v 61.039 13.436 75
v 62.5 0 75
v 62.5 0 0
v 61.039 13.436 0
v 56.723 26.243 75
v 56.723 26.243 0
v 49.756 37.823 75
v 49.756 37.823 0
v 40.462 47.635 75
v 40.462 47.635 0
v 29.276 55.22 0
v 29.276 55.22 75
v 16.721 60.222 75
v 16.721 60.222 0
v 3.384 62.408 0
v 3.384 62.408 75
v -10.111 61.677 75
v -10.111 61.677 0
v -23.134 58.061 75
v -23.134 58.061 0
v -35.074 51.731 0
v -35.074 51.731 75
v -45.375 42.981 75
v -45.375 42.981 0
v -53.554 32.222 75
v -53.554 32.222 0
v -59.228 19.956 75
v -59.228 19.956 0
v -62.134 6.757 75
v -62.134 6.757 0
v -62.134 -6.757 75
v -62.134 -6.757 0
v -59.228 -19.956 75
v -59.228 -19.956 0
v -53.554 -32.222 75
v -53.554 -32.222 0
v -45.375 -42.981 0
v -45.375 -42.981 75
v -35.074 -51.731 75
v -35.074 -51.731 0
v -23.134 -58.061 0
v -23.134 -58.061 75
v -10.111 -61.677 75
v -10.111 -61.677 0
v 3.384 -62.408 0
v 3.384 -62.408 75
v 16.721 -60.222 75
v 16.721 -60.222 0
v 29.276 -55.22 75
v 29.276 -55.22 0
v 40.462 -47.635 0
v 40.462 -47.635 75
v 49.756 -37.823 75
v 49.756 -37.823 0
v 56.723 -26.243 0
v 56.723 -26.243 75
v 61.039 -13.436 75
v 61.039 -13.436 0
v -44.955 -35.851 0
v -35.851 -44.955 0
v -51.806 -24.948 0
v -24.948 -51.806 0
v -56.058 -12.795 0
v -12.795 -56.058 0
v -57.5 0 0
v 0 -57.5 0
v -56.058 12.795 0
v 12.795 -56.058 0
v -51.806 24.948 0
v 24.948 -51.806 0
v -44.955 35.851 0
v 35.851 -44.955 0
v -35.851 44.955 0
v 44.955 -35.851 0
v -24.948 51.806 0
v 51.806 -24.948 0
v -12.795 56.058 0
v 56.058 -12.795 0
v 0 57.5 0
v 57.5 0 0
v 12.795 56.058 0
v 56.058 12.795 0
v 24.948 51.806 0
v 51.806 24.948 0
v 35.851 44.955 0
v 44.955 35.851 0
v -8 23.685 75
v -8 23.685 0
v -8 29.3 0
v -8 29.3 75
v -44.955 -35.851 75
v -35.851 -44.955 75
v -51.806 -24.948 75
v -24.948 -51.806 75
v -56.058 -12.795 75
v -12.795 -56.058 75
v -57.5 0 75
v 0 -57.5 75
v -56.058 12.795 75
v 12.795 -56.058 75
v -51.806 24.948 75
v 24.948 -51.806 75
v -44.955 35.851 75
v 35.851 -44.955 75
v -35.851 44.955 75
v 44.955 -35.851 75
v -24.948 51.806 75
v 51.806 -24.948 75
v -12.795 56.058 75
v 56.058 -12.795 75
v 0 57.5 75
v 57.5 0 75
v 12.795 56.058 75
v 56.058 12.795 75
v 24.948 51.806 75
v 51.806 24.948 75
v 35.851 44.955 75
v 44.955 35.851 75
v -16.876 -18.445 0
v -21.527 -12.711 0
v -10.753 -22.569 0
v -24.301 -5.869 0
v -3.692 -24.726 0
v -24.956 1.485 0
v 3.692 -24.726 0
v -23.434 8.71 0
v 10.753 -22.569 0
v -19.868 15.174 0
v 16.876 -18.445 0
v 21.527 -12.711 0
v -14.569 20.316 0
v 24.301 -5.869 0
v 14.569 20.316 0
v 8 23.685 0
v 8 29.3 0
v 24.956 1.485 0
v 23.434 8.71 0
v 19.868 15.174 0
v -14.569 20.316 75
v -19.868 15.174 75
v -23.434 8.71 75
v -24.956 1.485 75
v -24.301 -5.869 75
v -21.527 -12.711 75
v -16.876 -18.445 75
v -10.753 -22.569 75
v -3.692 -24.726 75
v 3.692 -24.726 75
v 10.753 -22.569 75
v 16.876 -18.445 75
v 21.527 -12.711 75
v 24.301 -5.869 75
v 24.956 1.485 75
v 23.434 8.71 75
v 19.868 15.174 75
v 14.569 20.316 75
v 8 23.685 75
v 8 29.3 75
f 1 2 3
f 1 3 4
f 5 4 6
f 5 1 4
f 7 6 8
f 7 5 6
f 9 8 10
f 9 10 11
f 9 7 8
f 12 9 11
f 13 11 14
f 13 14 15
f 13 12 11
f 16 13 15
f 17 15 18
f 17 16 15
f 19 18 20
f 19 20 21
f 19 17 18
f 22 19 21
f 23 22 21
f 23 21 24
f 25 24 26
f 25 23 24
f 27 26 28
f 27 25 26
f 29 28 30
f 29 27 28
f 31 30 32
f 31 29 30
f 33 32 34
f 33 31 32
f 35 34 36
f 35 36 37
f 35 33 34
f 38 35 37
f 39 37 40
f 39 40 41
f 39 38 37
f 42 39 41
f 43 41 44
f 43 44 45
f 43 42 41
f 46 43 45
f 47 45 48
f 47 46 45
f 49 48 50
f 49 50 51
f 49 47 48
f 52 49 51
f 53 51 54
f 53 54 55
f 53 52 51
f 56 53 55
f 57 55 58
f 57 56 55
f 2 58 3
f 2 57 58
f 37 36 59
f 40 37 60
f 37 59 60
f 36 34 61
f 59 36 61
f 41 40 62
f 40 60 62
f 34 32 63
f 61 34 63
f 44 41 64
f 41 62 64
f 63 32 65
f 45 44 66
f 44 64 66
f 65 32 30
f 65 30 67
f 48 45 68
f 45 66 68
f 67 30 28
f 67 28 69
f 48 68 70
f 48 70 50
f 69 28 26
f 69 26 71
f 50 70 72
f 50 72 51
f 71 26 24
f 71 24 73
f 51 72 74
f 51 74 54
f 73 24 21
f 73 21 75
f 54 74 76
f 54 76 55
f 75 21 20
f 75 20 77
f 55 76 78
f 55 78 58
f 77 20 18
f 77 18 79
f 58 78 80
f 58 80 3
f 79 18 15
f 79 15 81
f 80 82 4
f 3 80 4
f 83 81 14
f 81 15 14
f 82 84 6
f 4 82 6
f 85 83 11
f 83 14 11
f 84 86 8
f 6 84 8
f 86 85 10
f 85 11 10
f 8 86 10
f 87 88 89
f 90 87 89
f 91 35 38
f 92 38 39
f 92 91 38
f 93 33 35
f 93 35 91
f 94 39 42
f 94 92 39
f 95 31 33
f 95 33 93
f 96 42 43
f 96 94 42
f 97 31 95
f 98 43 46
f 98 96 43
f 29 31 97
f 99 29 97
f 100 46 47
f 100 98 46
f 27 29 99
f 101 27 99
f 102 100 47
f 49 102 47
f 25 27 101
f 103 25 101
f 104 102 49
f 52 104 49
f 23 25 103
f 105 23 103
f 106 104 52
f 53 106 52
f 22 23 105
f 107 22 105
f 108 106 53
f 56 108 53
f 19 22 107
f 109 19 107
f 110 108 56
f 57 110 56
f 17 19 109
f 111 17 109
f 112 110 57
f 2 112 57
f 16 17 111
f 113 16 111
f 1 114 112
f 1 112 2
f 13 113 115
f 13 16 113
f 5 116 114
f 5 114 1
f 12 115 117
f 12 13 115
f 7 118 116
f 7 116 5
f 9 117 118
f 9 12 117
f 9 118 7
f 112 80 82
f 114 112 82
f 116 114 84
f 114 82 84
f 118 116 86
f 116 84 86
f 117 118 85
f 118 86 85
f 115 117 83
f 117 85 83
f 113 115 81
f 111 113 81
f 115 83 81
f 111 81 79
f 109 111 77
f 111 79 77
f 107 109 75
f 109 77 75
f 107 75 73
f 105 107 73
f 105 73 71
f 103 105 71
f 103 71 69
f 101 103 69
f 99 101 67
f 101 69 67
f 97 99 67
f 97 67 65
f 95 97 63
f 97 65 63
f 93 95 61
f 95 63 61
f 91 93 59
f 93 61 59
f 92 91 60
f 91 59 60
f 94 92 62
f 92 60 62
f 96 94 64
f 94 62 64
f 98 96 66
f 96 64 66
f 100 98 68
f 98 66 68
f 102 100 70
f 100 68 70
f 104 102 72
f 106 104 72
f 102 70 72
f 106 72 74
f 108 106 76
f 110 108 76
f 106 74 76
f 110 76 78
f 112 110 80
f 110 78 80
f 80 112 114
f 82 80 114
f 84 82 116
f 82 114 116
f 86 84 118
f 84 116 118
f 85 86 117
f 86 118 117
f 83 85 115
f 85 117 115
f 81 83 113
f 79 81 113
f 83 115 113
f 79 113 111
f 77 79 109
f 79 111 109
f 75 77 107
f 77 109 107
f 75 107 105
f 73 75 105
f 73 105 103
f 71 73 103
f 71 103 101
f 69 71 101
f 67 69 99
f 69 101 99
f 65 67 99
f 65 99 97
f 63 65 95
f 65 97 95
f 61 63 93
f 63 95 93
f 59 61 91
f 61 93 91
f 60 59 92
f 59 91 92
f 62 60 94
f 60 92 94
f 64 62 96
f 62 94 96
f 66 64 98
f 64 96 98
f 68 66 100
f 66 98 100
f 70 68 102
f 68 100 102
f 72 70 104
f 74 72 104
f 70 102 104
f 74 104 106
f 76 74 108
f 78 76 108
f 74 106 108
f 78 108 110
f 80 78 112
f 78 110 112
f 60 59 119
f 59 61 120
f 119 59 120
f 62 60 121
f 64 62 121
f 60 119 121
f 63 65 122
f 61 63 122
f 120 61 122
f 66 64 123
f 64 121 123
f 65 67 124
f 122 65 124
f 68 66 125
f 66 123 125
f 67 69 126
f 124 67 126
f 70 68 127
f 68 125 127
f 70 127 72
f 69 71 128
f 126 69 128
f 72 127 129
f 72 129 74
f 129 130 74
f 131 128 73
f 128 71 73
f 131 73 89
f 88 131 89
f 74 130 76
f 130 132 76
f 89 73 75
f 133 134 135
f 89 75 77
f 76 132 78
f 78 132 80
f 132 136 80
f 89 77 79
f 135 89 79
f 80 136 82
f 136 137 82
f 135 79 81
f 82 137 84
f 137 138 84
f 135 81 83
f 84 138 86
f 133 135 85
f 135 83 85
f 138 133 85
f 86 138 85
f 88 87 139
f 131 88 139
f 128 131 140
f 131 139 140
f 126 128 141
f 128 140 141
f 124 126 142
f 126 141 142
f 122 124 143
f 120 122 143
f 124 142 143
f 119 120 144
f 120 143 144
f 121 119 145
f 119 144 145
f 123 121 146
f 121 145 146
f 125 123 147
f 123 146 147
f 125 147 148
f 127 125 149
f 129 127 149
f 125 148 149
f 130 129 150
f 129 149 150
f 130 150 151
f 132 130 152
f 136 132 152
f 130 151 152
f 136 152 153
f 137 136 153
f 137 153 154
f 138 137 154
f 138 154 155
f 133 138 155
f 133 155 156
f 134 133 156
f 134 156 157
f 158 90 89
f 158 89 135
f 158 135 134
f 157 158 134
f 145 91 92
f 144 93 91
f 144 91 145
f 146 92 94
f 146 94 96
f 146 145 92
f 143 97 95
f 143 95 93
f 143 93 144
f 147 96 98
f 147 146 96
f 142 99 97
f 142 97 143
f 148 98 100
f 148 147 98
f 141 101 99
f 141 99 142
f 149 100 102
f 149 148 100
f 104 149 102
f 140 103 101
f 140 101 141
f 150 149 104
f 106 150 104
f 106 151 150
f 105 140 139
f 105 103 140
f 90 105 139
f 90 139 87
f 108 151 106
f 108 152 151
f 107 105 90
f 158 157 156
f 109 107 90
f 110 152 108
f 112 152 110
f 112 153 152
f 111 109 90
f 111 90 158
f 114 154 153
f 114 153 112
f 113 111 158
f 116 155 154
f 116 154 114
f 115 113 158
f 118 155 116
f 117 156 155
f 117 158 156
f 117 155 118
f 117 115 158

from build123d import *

# Parameters (mm, degrees)
SKETCH1_R           = 57.5
BOSS_EXTRUDE1_DEPTH = 75
SKETCH2_R           = 25
CUT_EXTRUDE1_DEPTH  = 111.623234449
CUT_EXTRUDE2_DEPTH  = 111.623234449
SKETCH4_R           = 62.5
SKETCH4_R_2         = 57.5
BOSS_EXTRUDE3_DEPTH = 75


with BuildPart() as part:
    # Sketch1 → Boss-Extrude1 (new body)
    with BuildSketch(Plane.XY):
        Circle(SKETCH1_R)
    extrude(amount=BOSS_EXTRUDE1_DEPTH)

    # Sketch2 → Cut-Extrude1 (cut, through all)
    with BuildSketch(Plane.XY.offset(75)):
        Circle(SKETCH2_R)
    extrude(amount=-CUT_EXTRUDE1_DEPTH, mode=Mode.SUBTRACT)

    # Sketch3 → Cut-Extrude2 (cut, through all)
    with BuildSketch(Plane.XY.offset(75)):
        with BuildLine():
            Line((-8, 23.685438565), (-8, 29.3))
            Line((-8, 29.3), (8, 29.3))
            Line((8, 29.3), (8, 23.685438565))
            ThreePointArc((8, 23.685438565), (0, 25), (-8, 23.685438565))
        make_face()
    extrude(amount=-CUT_EXTRUDE2_DEPTH, mode=Mode.SUBTRACT)


with BuildPart() as body_2:
    # Sketch4 → Boss-Extrude3 (new body)
    with BuildSketch(Plane.XY.offset(75)):
        Circle(SKETCH4_R)
        Circle(SKETCH4_R_2, mode=Mode.SUBTRACT)
    extrude(amount=-BOSS_EXTRUDE3_DEPTH)


solid = Compound([part.part, body_2.part])
